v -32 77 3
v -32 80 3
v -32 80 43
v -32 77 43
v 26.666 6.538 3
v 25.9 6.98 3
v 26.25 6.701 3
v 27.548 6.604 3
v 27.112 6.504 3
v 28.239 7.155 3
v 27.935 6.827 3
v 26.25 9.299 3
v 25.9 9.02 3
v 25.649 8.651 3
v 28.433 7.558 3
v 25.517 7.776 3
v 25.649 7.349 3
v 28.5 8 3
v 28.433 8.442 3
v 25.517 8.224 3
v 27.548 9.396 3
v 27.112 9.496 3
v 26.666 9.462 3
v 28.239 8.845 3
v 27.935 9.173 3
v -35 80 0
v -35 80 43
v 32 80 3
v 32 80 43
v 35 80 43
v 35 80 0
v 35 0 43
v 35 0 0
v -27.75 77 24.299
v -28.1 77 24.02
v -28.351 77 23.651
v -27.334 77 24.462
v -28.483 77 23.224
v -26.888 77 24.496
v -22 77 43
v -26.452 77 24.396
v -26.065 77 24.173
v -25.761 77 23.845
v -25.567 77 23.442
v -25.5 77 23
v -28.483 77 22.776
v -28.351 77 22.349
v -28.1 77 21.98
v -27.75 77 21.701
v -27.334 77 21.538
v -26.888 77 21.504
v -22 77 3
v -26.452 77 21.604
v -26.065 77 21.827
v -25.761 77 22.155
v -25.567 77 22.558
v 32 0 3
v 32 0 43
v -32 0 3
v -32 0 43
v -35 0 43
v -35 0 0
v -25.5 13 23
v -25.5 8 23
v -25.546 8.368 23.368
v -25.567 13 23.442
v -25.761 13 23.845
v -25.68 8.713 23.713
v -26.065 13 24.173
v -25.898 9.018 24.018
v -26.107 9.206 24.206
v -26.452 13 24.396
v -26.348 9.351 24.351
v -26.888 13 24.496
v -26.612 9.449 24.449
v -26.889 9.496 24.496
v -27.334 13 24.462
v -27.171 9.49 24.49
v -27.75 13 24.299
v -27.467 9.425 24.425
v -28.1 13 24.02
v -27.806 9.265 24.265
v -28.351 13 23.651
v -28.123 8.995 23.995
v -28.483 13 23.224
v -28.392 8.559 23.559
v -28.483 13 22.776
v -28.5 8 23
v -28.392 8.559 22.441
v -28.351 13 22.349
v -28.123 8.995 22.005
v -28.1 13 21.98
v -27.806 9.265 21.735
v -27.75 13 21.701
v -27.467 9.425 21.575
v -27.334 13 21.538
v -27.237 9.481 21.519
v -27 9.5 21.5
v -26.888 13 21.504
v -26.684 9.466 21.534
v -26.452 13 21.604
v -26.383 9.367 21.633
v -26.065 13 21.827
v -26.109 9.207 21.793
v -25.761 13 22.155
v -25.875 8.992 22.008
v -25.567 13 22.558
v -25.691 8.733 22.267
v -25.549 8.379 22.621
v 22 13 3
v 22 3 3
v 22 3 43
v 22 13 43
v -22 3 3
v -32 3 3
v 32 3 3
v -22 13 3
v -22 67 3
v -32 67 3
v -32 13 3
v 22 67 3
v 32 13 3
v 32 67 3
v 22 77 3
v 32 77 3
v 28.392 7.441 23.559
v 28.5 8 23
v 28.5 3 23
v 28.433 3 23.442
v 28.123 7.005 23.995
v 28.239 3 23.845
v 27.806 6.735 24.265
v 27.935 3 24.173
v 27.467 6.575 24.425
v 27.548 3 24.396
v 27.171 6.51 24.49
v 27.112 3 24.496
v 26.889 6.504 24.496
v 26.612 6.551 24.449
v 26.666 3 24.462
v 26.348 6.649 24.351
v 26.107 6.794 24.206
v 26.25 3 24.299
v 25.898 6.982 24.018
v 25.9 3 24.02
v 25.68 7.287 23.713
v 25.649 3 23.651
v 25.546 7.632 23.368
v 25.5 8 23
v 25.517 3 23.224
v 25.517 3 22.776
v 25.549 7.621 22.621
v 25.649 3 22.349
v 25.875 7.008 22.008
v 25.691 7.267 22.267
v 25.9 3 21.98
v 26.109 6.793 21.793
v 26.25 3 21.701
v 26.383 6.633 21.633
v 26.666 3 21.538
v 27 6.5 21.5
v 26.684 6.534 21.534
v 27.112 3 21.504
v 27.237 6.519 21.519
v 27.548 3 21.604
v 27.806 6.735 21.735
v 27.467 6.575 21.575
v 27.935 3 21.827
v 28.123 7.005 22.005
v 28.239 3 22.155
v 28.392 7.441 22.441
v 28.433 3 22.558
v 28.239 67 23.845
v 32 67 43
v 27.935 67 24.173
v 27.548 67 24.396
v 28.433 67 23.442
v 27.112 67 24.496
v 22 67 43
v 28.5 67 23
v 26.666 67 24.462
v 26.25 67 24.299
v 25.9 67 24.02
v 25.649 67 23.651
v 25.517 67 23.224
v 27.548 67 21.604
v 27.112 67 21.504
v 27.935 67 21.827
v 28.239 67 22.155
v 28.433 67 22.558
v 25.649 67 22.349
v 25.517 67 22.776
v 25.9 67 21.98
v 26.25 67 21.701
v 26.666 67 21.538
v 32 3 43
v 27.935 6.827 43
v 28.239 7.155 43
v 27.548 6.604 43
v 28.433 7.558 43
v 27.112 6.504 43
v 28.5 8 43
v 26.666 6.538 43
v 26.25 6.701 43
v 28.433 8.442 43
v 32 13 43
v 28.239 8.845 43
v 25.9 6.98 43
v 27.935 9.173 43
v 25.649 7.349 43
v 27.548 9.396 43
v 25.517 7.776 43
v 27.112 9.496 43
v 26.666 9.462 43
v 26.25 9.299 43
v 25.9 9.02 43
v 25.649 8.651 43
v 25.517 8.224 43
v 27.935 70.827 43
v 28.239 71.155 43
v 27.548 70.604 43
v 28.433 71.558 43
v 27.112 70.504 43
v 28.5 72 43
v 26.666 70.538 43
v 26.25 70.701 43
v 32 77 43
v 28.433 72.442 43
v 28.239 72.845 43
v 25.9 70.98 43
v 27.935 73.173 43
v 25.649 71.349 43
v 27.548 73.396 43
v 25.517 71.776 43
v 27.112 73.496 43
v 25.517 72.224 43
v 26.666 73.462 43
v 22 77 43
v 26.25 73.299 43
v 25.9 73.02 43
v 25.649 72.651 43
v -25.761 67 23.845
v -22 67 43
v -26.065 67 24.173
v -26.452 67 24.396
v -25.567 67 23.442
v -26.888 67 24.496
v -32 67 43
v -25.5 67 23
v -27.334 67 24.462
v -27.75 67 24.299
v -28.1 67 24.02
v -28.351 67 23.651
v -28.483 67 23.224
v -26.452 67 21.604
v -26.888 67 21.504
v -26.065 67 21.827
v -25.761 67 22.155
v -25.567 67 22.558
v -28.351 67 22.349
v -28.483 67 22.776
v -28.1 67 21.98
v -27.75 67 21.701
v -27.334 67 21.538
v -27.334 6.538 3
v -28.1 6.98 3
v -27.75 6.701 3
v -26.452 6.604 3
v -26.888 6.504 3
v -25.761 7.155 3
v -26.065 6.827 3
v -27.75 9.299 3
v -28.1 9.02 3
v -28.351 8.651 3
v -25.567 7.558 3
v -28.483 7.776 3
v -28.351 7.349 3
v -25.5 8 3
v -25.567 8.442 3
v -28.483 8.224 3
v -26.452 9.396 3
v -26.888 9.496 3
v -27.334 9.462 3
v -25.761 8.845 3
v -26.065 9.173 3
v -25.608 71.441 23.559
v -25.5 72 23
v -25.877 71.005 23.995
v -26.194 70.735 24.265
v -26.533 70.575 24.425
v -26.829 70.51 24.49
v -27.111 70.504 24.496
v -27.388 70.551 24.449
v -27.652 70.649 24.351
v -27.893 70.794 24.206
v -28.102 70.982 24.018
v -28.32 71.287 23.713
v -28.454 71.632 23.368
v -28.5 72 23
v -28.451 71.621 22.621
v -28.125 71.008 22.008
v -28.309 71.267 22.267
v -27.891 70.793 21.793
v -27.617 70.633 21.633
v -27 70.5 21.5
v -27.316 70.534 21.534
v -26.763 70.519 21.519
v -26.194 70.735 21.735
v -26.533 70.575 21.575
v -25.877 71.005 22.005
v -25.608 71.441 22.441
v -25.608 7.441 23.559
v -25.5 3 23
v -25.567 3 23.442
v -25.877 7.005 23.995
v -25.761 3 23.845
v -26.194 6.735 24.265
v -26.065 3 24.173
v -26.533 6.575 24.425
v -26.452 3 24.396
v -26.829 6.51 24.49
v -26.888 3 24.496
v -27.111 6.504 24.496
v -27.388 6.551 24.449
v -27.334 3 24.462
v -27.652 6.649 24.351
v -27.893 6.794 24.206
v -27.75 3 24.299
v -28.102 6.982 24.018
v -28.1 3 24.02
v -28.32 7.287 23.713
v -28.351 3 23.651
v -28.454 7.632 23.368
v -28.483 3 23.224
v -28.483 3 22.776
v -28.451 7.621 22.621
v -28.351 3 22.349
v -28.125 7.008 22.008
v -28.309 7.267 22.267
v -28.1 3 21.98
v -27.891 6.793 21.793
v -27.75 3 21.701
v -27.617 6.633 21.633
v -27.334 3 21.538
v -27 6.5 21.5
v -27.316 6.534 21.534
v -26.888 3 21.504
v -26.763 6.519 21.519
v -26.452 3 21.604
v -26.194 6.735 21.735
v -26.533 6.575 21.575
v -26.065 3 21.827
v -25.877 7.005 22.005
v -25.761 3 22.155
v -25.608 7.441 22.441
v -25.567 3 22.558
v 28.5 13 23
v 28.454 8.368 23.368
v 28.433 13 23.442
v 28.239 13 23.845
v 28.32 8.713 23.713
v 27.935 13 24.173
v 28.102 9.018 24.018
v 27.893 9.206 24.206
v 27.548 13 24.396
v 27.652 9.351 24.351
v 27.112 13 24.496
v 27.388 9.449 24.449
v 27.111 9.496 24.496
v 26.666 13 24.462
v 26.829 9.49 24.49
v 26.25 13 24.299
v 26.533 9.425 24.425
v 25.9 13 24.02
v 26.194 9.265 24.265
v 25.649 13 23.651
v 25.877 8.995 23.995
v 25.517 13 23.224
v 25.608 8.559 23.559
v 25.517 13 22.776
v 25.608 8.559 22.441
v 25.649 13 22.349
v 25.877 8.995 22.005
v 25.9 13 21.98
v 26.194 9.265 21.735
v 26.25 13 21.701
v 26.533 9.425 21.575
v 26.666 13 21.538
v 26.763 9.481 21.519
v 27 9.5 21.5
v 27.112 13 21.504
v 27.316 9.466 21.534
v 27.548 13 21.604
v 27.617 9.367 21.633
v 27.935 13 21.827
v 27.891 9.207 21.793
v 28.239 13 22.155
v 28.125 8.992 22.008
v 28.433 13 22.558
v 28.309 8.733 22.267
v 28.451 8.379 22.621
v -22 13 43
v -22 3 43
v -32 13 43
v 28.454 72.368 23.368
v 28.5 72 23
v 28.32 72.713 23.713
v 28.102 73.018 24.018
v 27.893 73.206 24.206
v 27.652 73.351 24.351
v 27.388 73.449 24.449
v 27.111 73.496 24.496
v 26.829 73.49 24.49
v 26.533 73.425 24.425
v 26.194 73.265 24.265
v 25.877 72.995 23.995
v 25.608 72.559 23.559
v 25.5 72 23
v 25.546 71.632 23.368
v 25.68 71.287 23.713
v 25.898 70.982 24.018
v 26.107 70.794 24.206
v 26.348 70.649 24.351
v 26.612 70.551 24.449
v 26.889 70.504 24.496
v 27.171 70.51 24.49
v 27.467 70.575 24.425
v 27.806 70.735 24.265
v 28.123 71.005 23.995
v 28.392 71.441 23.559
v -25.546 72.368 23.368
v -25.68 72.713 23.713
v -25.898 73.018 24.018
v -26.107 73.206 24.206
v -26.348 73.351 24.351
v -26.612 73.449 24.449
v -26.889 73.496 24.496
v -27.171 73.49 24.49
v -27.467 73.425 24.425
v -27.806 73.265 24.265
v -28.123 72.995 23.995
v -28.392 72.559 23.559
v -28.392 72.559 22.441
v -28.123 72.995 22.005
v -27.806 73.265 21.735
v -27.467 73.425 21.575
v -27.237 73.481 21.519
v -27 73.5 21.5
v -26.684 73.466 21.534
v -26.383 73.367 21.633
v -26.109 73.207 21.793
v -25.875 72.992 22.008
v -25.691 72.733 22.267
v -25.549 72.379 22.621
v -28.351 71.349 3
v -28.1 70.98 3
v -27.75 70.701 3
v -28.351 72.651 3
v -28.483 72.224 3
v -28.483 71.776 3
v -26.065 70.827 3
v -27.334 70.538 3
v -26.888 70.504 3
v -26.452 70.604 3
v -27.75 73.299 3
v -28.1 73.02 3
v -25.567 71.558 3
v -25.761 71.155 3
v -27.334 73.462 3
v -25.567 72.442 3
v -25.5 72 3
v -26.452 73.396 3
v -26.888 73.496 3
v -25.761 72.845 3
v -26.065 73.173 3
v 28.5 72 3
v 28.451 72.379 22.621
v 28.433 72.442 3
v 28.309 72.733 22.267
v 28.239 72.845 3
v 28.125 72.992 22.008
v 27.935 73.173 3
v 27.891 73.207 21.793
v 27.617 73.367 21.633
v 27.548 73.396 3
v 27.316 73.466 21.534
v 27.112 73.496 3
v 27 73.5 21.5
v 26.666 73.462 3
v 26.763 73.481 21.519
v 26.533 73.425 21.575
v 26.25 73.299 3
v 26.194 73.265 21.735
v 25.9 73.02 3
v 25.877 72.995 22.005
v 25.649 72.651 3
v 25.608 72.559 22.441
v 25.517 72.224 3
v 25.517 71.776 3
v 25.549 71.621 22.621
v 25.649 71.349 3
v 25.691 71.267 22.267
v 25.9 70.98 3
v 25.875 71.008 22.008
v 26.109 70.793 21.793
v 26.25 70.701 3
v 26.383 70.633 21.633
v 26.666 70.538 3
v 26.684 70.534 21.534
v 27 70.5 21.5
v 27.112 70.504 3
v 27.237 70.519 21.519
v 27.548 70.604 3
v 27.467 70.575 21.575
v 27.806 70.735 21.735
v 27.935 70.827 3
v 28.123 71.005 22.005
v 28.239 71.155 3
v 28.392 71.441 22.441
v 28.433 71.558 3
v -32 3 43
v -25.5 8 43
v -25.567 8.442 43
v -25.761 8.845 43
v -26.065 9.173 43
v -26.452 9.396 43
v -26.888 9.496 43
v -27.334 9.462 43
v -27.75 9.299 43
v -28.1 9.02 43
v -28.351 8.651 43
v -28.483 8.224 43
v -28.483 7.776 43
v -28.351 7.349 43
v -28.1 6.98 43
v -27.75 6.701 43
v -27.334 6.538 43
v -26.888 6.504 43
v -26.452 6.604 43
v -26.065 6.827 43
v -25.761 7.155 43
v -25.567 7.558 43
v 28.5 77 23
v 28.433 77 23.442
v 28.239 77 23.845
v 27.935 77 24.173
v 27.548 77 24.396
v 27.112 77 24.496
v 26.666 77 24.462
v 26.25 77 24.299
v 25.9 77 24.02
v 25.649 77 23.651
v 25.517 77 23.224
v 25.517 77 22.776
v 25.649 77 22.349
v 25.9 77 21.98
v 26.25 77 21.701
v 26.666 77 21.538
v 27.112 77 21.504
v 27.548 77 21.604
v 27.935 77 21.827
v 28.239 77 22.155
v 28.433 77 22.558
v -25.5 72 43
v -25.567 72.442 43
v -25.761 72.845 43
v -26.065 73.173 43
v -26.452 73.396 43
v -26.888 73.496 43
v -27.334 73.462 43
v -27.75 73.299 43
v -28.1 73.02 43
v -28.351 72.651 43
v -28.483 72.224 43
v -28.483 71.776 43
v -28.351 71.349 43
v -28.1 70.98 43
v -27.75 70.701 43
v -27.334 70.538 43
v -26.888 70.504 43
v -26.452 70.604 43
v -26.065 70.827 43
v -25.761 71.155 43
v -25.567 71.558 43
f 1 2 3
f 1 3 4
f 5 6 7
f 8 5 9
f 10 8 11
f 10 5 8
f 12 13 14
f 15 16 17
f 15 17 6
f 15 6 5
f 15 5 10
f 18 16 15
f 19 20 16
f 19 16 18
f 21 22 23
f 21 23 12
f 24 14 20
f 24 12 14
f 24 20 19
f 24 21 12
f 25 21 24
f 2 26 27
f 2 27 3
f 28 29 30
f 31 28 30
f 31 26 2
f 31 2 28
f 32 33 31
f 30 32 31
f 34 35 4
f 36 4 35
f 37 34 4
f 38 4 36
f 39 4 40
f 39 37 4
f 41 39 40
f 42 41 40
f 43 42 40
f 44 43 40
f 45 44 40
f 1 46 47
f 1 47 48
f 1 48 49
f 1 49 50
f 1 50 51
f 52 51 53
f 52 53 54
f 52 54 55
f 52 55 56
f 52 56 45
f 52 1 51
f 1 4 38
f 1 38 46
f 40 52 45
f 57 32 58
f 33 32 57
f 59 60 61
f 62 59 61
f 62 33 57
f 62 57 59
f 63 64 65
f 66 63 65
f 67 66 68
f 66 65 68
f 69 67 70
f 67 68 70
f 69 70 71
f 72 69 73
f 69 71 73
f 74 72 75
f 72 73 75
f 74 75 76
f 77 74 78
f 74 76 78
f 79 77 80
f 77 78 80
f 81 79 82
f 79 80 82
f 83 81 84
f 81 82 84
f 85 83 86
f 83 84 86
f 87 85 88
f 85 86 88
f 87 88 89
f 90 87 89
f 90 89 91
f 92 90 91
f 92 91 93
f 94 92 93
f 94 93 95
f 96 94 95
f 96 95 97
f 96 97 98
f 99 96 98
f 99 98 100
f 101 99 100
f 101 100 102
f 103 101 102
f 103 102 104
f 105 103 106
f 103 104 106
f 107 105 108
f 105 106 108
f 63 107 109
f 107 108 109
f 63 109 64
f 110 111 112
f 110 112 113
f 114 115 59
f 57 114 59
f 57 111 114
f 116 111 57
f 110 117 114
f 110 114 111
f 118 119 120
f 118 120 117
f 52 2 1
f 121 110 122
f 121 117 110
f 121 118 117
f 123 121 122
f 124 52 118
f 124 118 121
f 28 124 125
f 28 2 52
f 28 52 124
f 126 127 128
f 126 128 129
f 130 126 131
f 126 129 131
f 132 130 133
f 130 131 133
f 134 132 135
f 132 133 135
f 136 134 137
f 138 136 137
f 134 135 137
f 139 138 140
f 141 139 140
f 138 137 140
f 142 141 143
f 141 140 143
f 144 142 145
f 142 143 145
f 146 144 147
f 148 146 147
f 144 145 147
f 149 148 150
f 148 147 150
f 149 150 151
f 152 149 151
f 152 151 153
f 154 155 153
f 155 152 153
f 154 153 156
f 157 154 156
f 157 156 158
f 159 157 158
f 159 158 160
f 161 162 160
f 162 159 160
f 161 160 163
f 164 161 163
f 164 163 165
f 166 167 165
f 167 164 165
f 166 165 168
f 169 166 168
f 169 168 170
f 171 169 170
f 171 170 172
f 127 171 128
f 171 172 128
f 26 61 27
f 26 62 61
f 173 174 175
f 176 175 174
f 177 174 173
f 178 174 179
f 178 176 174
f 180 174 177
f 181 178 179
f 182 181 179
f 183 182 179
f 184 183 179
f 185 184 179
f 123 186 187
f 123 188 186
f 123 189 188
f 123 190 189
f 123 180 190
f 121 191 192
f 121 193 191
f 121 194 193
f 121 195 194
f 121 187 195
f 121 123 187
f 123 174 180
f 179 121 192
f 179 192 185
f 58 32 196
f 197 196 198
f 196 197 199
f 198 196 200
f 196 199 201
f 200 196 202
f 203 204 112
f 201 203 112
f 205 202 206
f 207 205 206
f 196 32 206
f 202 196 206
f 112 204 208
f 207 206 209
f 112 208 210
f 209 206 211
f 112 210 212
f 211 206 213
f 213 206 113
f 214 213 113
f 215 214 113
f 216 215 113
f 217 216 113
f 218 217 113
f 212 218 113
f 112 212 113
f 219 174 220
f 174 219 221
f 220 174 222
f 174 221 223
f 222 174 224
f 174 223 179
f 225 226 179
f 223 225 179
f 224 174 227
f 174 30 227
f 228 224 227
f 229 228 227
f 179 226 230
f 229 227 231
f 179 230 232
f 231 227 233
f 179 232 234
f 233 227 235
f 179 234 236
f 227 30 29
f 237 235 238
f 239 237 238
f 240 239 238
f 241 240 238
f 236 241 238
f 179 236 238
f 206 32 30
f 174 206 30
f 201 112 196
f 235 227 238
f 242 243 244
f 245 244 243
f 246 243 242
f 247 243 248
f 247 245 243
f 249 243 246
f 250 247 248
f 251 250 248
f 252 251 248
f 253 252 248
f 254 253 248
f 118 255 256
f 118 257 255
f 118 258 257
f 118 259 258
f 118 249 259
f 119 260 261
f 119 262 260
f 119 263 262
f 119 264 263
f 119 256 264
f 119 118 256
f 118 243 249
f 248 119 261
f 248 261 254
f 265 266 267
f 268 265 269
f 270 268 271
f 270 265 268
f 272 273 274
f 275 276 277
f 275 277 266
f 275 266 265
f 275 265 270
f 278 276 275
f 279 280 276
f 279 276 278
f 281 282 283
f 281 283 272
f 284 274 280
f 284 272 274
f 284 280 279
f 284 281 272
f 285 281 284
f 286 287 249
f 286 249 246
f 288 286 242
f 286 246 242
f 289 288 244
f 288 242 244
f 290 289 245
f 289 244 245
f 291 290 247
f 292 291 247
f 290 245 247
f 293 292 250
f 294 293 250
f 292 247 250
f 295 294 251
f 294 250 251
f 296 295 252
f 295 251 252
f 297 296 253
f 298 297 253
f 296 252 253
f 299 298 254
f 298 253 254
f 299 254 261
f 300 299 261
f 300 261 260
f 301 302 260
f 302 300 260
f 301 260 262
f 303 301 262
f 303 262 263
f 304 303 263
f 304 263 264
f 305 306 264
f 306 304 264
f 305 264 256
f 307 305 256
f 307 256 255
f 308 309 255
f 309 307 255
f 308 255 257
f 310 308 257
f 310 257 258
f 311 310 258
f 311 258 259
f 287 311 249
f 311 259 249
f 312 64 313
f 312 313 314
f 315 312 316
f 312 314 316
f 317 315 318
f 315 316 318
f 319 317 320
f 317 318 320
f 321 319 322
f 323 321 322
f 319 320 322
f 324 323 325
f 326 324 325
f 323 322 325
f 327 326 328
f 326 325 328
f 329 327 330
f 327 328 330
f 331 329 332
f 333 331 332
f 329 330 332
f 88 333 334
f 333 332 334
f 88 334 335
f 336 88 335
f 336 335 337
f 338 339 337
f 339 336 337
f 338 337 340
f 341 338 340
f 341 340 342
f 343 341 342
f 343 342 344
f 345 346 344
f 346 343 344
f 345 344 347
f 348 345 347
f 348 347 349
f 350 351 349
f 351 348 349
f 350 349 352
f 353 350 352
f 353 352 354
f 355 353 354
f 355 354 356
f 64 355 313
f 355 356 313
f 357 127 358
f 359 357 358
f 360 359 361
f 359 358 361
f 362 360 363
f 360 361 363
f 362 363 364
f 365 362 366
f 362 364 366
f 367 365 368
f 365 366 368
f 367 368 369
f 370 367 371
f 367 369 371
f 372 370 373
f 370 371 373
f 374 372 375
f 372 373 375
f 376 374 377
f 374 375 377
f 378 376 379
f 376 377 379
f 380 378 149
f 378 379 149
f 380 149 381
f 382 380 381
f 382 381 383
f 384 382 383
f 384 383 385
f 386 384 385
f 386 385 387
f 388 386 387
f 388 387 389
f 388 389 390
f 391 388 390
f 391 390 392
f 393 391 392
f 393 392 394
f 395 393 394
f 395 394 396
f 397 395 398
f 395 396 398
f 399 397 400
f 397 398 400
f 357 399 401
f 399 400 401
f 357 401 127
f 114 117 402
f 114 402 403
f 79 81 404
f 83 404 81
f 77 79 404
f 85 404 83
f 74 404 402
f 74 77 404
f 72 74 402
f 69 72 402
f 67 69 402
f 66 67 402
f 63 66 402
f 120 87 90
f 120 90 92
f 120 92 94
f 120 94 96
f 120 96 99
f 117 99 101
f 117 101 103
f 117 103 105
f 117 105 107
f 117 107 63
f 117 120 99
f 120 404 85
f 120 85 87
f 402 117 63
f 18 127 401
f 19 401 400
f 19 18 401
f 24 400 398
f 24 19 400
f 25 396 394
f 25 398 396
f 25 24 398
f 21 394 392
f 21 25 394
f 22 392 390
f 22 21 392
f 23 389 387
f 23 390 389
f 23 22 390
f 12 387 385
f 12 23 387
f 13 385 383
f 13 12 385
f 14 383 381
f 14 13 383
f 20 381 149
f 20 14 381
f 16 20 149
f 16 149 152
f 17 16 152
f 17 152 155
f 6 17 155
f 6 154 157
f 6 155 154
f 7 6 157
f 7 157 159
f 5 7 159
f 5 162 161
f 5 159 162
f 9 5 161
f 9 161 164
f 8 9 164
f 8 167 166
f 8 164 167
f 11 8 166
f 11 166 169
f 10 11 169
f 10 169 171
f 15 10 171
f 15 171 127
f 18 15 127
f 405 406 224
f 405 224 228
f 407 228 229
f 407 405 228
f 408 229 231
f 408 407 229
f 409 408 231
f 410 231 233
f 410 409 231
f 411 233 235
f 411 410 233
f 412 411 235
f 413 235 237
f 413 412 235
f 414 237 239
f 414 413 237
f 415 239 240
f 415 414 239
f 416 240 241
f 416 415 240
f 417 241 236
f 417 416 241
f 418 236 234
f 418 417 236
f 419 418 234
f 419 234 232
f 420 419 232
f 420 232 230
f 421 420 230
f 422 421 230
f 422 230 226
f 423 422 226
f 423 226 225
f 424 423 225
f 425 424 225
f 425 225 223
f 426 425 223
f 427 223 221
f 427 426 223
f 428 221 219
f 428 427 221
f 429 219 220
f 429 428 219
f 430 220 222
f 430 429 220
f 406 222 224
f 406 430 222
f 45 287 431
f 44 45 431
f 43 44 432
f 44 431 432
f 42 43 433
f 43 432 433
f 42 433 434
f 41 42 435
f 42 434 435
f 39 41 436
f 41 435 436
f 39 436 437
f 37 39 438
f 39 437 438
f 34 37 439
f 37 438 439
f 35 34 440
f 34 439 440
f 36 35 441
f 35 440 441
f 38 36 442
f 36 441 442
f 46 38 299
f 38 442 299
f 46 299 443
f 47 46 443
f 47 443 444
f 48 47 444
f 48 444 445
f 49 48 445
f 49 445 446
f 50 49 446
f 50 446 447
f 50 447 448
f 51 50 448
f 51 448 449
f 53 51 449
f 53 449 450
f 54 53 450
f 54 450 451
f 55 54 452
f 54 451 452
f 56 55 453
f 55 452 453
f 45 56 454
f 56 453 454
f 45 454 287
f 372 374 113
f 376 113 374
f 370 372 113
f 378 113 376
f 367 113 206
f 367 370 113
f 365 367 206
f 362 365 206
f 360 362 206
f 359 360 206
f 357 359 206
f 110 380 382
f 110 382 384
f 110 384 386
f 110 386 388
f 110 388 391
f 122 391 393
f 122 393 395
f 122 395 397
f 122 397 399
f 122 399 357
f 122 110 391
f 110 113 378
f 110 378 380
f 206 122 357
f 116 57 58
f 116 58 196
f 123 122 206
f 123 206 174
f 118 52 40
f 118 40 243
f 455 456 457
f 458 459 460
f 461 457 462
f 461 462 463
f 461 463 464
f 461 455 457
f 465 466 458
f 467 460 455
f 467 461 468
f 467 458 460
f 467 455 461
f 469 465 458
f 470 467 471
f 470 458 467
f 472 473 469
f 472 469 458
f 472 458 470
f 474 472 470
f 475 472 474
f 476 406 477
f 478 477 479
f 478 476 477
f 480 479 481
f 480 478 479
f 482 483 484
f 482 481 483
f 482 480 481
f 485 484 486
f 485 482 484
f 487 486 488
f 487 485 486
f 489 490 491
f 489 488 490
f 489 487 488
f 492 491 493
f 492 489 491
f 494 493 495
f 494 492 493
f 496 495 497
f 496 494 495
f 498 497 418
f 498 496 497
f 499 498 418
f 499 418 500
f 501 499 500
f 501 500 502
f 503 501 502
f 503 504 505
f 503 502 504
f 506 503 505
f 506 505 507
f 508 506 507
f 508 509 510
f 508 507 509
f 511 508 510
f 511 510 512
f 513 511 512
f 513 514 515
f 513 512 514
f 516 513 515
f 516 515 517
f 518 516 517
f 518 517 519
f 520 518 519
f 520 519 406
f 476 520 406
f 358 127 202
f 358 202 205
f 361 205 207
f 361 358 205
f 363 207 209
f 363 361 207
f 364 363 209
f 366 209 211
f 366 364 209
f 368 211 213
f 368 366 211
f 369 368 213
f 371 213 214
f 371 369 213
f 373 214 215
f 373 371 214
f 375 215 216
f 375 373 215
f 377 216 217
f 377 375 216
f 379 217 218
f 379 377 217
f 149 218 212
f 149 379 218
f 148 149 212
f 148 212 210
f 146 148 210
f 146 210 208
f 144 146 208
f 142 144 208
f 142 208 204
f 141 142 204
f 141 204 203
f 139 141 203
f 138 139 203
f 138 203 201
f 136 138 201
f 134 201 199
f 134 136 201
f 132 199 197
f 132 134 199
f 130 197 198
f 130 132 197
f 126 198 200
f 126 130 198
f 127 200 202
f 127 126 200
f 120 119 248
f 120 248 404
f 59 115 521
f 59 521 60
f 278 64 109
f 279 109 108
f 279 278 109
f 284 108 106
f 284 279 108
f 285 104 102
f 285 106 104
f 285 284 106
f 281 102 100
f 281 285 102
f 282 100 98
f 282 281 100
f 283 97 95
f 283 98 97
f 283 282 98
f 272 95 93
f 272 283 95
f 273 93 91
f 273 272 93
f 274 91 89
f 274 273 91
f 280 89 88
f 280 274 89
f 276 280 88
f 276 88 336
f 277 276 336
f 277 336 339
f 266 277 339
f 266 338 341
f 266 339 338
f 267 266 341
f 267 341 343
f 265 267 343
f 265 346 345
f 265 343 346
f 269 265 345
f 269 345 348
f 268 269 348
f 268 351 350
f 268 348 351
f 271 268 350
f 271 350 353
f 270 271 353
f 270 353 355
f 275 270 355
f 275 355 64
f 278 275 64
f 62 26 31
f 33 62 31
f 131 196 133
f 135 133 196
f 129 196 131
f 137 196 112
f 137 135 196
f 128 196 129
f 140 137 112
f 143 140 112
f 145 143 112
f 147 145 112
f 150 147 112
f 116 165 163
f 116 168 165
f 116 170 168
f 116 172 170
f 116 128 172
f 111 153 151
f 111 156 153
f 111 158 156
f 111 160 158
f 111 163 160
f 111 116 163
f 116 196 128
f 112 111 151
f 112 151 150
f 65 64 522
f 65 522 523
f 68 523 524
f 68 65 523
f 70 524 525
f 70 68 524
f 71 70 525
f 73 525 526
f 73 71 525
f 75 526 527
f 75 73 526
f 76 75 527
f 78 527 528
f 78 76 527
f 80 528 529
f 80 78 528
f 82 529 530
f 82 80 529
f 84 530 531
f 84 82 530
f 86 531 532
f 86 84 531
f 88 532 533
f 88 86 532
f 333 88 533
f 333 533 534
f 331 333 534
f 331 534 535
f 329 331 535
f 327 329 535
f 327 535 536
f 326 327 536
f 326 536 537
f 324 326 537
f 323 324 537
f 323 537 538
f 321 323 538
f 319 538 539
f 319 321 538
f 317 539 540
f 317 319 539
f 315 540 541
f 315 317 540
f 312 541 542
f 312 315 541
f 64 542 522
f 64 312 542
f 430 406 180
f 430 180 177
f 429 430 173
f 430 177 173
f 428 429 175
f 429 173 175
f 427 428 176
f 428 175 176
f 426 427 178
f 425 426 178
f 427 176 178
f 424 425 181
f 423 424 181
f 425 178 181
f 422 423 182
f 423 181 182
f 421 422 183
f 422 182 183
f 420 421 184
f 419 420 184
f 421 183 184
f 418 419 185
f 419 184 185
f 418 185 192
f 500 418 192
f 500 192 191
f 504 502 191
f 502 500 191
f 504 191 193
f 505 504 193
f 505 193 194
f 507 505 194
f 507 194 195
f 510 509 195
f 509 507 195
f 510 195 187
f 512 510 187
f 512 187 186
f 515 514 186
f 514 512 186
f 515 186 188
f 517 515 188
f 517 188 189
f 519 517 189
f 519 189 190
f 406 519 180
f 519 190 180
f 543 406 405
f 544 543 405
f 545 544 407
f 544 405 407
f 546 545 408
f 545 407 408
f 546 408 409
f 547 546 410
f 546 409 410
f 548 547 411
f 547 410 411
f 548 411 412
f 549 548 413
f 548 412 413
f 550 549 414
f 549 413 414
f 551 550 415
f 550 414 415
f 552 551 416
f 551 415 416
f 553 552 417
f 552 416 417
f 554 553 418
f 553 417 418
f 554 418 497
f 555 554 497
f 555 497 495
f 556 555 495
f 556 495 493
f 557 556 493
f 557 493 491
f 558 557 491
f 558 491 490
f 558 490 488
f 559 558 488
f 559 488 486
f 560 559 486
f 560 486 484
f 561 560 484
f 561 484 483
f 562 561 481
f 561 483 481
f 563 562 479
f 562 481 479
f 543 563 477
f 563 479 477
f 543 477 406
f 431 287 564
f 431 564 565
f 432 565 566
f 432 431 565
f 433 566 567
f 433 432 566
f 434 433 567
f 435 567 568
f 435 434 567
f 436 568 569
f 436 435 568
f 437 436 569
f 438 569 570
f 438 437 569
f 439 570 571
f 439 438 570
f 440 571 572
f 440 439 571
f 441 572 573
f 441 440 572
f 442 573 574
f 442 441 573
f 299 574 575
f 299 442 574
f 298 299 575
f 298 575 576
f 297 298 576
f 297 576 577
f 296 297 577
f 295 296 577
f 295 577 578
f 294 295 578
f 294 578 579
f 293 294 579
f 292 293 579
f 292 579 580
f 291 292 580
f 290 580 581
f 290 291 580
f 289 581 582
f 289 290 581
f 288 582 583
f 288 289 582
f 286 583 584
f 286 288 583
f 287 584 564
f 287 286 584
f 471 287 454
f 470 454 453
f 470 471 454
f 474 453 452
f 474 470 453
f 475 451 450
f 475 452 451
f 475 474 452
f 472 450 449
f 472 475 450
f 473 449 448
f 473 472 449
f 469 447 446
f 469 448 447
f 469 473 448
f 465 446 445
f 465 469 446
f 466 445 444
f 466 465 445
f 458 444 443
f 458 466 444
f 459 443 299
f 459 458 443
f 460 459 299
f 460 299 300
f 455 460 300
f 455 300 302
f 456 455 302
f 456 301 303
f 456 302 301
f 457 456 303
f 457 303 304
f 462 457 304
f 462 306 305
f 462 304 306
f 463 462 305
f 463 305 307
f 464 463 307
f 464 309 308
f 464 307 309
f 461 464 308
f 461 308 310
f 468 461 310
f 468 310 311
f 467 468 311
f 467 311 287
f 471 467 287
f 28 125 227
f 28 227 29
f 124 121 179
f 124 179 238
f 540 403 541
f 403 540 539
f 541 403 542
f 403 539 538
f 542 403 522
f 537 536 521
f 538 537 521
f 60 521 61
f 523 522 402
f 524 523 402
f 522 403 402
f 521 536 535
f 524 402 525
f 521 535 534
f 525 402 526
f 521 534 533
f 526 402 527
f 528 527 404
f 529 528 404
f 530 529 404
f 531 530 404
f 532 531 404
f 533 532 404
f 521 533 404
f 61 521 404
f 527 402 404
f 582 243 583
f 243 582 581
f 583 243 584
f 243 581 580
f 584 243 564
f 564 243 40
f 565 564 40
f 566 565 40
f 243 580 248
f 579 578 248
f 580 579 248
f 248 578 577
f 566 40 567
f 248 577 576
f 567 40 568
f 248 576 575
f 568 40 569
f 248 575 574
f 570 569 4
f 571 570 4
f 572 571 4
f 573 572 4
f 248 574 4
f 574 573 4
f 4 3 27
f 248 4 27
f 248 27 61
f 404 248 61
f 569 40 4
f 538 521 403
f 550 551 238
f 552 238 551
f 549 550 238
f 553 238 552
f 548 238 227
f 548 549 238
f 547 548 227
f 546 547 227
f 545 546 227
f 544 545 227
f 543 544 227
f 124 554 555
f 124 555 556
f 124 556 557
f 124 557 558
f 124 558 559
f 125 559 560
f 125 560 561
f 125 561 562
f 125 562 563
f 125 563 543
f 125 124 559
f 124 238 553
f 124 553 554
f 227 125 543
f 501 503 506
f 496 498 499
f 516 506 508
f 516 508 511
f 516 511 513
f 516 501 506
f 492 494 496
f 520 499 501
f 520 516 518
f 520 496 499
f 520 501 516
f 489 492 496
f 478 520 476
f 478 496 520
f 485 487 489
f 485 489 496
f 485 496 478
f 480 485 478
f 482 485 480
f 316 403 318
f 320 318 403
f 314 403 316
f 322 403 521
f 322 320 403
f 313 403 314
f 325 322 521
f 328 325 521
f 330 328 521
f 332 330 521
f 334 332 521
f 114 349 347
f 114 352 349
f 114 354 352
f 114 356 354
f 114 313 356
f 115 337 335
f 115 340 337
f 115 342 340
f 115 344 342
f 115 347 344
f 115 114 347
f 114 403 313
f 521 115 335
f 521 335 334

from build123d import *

# Parameters (mm, degrees)
SKETCH_W     = 70
SKETCH_H     = 80
PAD_DEPTH    = 3
SKETCH001_R  = 1.5
PAD001_DEPTH = 40
SKETCH002_R  = 1.5
POCKET_DEPTH = 77.001


with BuildPart() as part:
    # Sketch → Pad (new body)
    with BuildSketch(Plane.XY):
        with Locations((0, 40)):
            Rectangle(SKETCH_W, SKETCH_H)
    extrude(amount=PAD_DEPTH)

    # Sketch001 (on Face6 of Pad) → Pad001 (join)
    with BuildSketch(Plane.XY.offset(3)):
        Polygon((-35, 0), (-35, 80), (-32, 80), (-32, 77), (-22, 77), (-22, 67), (-32, 67), (-32, 13), (-22, 13), (-22, 3), (-32, 3), (-32, 0), align=None)
        with Locations((-27, 8)):
            Circle(SKETCH001_R, mode=Mode.SUBTRACT)
        with Locations((-27, 72)):
            Circle(SKETCH001_R, mode=Mode.SUBTRACT)
        Polygon((35, 80), (35, 0), (32, 0), (32, 3), (22, 3), (22, 13), (32, 13), (32, 67), (22, 67), (22, 77), (32, 77), (32, 80), align=None)
        with Locations((27, 8)):
            Circle(SKETCH001_R, mode=Mode.SUBTRACT)
        with Locations((27, 72)):
            Circle(SKETCH001_R, mode=Mode.SUBTRACT)
    extrude(amount=PAD001_DEPTH)

    # Sketch002 (on Face21 of Pad001) → Pocket (cut, through all)
    with BuildSketch(Plane.XZ.offset(-3)):
        with Locations((27, 23)):
            Circle(SKETCH002_R)
        with Locations((-27, 23)):
            Circle(SKETCH002_R)
    extrude(amount=-POCKET_DEPTH, mode=Mode.SUBTRACT)


solid = part.part
